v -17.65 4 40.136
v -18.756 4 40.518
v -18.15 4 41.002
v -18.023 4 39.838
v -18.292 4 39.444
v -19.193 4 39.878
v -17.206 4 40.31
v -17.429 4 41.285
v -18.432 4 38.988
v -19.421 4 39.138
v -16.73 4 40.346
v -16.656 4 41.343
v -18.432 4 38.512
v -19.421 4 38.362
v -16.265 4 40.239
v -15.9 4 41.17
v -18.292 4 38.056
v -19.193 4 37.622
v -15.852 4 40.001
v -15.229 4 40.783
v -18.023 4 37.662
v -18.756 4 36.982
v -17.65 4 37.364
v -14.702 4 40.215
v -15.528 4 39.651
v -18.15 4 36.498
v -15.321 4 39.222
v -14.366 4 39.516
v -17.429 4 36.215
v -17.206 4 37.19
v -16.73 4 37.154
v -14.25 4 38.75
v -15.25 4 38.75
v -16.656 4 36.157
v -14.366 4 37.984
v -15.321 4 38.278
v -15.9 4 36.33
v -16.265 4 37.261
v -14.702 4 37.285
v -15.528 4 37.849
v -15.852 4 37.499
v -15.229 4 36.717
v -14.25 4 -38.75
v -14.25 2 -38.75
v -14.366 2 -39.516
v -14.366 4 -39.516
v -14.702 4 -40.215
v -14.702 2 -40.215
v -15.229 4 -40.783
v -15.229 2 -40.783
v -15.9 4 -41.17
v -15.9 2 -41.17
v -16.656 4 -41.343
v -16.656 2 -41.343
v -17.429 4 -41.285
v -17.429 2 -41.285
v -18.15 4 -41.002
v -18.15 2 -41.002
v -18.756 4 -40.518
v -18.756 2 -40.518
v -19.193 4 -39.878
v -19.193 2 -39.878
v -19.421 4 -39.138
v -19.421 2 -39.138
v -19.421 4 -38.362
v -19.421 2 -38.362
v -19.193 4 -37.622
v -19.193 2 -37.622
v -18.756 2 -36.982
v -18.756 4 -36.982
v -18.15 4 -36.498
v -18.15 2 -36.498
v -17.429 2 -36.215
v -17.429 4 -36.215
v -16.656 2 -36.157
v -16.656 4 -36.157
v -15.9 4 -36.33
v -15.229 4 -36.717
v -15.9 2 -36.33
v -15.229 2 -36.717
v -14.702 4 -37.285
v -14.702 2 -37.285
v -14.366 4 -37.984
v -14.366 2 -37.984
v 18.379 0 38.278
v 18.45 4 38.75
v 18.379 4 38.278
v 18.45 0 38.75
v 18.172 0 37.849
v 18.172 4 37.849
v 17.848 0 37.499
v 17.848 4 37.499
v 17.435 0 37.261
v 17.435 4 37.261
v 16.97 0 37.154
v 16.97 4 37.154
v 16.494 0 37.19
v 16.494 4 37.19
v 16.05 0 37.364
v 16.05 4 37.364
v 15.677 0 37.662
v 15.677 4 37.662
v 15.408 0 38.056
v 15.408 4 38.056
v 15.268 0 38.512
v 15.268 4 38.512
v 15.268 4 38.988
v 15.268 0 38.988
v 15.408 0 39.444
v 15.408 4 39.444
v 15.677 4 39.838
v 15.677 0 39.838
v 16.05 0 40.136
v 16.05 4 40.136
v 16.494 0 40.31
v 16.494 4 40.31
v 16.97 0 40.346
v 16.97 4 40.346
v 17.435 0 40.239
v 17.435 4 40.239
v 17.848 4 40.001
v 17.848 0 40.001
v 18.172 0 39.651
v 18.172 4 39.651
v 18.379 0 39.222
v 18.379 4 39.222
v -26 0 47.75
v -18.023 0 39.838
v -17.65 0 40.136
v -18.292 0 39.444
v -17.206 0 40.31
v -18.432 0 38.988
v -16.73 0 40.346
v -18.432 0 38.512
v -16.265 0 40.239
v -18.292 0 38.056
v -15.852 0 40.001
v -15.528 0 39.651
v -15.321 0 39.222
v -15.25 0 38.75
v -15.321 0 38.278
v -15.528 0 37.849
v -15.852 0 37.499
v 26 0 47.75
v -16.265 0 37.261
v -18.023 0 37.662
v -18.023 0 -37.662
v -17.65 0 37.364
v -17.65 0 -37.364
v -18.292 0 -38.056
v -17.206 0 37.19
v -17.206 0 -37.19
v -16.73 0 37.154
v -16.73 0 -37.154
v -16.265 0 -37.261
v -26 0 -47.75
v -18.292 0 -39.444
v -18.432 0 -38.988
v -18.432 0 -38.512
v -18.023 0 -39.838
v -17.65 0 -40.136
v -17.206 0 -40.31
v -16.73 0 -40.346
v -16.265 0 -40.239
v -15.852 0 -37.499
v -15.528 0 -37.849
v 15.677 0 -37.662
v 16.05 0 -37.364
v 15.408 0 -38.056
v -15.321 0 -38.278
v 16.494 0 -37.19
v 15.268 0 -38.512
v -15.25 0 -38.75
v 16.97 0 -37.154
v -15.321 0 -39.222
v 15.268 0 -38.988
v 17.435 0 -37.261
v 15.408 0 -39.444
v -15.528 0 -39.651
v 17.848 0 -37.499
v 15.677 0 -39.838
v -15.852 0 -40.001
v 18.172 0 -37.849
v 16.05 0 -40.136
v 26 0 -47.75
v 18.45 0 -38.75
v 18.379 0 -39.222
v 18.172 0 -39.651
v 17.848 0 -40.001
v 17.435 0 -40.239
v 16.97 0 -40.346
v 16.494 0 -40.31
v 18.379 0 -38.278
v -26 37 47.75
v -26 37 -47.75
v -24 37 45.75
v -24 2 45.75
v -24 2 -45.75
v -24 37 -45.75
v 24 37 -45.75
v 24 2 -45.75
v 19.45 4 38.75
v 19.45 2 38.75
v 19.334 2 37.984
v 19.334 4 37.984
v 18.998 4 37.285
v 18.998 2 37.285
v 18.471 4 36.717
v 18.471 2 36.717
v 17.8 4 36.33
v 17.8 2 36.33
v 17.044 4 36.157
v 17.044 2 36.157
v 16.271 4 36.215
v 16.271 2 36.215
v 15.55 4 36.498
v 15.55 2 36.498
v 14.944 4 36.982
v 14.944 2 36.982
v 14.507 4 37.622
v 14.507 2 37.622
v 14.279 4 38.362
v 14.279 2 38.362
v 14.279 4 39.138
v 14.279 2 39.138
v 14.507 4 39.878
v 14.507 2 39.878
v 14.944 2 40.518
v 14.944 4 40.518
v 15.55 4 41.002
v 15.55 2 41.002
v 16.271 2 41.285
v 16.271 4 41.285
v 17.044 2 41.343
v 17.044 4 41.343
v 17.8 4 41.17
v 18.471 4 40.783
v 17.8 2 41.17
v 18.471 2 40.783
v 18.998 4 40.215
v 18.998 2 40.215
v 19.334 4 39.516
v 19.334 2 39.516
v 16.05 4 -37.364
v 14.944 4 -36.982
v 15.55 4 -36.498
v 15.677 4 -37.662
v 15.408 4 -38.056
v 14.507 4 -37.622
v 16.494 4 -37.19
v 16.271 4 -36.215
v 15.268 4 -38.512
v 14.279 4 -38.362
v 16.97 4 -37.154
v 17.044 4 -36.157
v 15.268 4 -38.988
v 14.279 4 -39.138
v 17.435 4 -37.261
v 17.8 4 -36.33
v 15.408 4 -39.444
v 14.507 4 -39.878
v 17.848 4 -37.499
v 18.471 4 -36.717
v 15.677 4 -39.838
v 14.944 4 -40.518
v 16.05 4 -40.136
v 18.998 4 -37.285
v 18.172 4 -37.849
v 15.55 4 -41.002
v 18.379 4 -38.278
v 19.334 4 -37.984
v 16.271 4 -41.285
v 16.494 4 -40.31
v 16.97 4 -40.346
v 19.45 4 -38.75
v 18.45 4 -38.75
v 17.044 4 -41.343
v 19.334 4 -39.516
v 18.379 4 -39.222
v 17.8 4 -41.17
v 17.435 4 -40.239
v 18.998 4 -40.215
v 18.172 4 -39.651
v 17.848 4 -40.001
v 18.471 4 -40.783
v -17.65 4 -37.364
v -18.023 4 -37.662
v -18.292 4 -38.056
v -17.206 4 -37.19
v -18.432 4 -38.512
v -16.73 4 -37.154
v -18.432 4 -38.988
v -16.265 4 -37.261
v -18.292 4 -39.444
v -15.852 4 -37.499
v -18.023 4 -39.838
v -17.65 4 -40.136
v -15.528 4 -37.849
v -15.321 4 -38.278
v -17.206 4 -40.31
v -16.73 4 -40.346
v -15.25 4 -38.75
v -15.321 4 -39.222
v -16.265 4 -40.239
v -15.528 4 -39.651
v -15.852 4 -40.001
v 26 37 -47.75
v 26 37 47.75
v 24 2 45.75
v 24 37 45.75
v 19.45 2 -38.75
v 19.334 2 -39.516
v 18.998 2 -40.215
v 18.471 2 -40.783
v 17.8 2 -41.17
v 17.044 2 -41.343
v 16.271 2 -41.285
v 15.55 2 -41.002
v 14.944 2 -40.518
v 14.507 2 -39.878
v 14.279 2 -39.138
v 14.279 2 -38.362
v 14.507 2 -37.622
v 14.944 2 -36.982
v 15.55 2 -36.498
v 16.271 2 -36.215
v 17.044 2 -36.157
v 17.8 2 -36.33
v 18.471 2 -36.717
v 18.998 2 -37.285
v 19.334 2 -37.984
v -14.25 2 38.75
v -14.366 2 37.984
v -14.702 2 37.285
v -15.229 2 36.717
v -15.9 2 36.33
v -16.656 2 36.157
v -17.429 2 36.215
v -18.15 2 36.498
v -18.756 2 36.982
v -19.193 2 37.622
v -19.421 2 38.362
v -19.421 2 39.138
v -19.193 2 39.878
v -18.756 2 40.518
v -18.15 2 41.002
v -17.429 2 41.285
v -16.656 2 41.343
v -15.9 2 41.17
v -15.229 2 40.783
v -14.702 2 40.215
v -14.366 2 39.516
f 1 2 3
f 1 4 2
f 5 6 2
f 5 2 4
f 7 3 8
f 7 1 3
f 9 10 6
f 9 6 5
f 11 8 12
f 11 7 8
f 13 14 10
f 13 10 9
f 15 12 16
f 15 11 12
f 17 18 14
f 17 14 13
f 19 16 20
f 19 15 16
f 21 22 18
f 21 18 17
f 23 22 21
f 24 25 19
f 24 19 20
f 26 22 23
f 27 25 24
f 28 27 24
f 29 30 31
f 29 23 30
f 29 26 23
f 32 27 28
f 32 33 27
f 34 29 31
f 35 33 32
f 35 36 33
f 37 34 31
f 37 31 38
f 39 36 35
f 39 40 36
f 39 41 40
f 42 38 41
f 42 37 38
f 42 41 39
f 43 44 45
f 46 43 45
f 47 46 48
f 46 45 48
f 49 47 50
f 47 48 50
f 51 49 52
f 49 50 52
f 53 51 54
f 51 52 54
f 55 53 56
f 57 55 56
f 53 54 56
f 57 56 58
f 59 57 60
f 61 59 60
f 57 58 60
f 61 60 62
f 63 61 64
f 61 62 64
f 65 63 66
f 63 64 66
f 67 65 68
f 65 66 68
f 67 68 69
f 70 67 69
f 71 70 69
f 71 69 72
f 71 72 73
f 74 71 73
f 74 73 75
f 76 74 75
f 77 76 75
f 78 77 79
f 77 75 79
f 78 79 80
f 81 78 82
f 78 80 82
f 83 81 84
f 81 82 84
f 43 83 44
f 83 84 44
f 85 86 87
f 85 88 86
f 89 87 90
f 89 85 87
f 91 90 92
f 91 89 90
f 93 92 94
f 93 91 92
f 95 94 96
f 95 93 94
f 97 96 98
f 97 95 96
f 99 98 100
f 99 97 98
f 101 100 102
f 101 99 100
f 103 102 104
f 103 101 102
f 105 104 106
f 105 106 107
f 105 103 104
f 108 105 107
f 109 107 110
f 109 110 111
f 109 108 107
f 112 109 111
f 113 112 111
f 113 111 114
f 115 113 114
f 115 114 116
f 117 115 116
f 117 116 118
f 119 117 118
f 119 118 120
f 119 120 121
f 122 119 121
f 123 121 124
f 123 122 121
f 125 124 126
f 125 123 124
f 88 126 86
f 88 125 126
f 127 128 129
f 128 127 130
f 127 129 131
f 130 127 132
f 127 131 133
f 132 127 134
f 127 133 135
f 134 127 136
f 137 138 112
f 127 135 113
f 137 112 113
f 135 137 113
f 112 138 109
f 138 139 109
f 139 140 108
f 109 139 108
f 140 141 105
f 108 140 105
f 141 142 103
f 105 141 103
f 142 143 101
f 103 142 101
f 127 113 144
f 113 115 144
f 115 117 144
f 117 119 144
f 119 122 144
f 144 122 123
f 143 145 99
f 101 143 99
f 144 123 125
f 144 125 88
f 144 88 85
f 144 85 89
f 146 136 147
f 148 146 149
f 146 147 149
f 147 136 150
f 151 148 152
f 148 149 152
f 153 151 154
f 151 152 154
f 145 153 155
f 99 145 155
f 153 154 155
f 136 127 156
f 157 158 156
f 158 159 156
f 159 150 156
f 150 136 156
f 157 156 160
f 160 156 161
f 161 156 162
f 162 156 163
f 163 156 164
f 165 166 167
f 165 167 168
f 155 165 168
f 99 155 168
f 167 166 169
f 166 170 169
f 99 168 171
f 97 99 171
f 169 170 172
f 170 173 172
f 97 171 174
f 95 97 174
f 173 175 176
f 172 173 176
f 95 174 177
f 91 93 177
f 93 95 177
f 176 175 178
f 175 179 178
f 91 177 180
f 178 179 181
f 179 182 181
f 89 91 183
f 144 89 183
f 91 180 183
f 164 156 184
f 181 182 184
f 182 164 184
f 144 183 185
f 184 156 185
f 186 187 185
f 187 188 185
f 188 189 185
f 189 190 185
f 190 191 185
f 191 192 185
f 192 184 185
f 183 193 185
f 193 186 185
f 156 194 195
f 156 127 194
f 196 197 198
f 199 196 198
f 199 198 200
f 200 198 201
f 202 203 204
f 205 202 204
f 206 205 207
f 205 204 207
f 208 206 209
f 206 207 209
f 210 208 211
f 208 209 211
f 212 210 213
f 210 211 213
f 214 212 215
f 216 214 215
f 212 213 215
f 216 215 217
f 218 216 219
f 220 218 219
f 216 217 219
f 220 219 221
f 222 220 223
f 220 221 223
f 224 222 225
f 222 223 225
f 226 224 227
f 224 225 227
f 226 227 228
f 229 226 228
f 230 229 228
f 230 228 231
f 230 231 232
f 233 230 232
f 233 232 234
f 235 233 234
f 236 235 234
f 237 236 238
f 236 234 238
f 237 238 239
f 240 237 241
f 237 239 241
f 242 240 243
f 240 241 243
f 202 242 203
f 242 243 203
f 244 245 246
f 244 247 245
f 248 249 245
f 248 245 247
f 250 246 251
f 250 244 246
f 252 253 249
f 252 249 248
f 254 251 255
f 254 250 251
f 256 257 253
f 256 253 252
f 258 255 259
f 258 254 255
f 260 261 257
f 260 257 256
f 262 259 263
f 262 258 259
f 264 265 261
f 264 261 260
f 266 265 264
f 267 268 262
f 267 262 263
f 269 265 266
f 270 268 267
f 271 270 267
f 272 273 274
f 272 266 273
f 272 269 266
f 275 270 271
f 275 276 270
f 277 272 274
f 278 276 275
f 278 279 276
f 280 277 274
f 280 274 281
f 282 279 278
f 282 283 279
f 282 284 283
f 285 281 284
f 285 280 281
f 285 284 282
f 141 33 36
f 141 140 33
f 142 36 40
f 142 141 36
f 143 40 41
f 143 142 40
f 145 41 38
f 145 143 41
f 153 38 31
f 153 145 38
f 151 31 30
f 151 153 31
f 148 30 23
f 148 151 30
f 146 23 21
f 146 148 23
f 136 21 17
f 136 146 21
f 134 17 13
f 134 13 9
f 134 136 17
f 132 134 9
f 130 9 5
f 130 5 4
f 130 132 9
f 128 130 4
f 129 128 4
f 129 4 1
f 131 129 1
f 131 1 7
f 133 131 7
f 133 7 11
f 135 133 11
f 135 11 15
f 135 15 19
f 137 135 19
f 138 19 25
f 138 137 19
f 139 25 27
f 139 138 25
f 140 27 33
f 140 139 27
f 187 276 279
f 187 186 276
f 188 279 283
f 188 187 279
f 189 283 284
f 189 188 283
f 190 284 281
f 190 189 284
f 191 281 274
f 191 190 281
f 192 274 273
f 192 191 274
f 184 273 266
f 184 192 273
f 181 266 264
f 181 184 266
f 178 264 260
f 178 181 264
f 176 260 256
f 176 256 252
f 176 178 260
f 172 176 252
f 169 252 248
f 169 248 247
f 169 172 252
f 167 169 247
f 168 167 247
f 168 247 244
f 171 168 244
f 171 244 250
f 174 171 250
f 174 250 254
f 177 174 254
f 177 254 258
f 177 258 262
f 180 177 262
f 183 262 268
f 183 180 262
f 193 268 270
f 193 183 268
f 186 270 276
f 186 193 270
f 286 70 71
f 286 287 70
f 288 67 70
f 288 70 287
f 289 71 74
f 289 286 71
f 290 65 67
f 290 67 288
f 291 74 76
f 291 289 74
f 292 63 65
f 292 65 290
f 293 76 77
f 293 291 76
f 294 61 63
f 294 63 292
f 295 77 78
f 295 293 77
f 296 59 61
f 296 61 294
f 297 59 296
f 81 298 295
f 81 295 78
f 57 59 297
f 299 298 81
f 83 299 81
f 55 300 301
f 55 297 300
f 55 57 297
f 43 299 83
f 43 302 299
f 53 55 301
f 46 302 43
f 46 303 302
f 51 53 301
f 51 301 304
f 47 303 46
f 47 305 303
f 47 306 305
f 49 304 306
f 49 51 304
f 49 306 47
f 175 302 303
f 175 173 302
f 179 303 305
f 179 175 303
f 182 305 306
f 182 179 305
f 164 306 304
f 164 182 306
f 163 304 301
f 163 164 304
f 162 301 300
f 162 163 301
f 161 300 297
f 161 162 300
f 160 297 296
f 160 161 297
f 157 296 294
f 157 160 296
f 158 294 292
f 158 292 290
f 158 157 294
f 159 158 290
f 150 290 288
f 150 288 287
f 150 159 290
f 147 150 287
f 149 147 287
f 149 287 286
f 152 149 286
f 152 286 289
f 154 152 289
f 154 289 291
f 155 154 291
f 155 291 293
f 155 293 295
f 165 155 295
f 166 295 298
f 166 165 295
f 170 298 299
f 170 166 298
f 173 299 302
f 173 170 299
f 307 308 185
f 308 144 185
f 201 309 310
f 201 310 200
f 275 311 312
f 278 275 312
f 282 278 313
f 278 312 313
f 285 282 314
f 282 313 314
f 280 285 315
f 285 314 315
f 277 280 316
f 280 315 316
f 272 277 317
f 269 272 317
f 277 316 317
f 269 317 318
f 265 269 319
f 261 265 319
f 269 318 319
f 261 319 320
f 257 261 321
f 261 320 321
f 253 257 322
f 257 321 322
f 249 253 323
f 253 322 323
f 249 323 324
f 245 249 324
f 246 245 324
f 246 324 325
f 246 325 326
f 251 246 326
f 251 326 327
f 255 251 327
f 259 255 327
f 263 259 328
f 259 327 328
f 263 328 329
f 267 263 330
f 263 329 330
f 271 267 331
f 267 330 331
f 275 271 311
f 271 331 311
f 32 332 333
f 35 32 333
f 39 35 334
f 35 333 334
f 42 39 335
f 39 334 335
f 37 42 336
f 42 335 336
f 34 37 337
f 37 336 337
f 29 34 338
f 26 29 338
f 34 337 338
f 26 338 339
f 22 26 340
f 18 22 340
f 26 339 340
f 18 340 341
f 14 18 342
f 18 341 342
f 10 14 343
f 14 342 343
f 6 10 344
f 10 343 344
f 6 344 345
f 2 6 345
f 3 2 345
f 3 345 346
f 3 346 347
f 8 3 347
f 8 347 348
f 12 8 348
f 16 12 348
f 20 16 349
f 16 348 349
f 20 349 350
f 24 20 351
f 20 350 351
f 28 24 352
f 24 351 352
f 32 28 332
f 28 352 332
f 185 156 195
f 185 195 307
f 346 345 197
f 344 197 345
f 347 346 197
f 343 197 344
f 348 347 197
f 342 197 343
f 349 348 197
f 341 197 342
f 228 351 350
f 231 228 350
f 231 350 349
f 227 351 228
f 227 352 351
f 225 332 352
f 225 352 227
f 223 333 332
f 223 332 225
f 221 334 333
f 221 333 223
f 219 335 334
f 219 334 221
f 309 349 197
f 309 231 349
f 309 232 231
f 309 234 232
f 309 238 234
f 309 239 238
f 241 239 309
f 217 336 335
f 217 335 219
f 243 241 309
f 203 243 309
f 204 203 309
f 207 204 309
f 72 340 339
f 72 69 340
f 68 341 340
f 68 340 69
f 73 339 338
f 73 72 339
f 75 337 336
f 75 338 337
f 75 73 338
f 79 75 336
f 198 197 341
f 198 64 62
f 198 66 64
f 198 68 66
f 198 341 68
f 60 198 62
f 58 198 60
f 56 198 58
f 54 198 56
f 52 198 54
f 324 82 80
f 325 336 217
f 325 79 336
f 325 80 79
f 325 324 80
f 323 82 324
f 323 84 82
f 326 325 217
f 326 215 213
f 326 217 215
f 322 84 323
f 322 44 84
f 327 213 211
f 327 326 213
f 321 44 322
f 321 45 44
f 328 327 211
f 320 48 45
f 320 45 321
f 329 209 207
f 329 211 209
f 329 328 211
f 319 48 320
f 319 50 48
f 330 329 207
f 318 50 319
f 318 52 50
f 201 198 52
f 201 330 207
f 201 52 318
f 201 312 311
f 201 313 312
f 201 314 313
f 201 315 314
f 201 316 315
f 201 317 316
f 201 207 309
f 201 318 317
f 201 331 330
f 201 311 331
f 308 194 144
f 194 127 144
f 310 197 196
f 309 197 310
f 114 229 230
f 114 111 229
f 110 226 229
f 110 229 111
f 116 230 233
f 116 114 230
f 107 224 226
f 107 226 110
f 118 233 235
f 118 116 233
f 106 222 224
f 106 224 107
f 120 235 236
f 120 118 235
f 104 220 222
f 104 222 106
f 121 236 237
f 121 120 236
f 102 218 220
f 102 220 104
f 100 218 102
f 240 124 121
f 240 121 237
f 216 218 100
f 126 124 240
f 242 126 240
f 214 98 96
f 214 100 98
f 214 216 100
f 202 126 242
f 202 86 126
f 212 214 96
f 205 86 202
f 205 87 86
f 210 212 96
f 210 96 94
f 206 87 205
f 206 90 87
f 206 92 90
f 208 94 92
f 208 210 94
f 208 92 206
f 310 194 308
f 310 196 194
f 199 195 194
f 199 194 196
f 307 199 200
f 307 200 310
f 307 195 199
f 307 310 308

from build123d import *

# Parameters (mm, degrees)
SKETCH1_W           = 52
SKETCH1_H           = 95.5
BOSS_EXTRUDE1_DEPTH = 2
SKETCH2_R           = 1.6
CUT_EXTRUDE1_DEPTH  = 2
SKETCH3_W           = 52
SKETCH3_H           = 95.5
SKETCH3_W_2         = 48
SKETCH3_H_2         = 91.5
BOSS_EXTRUDE2_DEPTH = 35
SKETCH4_R           = 2.6
SKETCH4_R_2         = 1.6
BOSS_EXTRUDE3_DEPTH = 2


with BuildPart() as part:
    # Sketch1 → Boss-Extrude1 (new body)
    with BuildSketch(Plane(origin=(0, 0, 0), x_dir=(1, 0, 0), z_dir=(0, 1, 0))):
        Rectangle(SKETCH1_W, SKETCH1_H)
    extrude(amount=BOSS_EXTRUDE1_DEPTH)

    # Sketch2 → Cut-Extrude1 (cut)
    with BuildSketch(Plane(origin=(0, 2, 0), x_dir=(1, 0, 0), z_dir=(0, 1, 0))):
        with Locations((-16.85, 38.75)):
            Circle(SKETCH2_R)
        with Locations((16.85, 38.75)):
            Circle(SKETCH2_R)
        with Locations((-16.85, -38.75)):
            Circle(SKETCH2_R)
        with Locations((16.85, -38.75)):
            Circle(SKETCH2_R)
    extrude(amount=-CUT_EXTRUDE1_DEPTH, mode=Mode.SUBTRACT)

    # Sketch3 → Boss-Extrude2 (add)
    with BuildSketch(Plane(origin=(0, 2, 0), x_dir=(1, 0, 0), z_dir=(0, 1, 0))):
        Rectangle(SKETCH3_W, SKETCH3_H)
        Rectangle(SKETCH3_W_2, SKETCH3_H_2, mode=Mode.SUBTRACT)
    extrude(amount=BOSS_EXTRUDE2_DEPTH)

    # Sketch4 → Boss-Extrude3 (add)
    with BuildSketch(Plane(origin=(0, 2, 0), x_dir=(1, 0, 0), z_dir=(0, 1, 0))):
        with Locations((-16.85, 38.75)):
            Circle(SKETCH4_R)
        with Locations((-16.85, 38.75)):
            Circle(SKETCH4_R_2, mode=Mode.SUBTRACT)
        with Locations((16.85, 38.75)):
            Circle(SKETCH4_R)
        with Locations((16.85, 38.75)):
            Circle(SKETCH4_R_2, mode=Mode.SUBTRACT)
        with Locations((16.85, -38.75)):
            Circle(SKETCH4_R)
        with Locations((16.85, -38.75)):
            Circle(SKETCH4_R_2, mode=Mode.SUBTRACT)
        with Locations((-16.85, -38.75)):
            Circle(SKETCH4_R)
        with Locations((-16.85, -38.75)):
            Circle(SKETCH4_R_2, mode=Mode.SUBTRACT)
    extrude(amount=BOSS_EXTRUDE3_DEPTH)


solid = part.part
